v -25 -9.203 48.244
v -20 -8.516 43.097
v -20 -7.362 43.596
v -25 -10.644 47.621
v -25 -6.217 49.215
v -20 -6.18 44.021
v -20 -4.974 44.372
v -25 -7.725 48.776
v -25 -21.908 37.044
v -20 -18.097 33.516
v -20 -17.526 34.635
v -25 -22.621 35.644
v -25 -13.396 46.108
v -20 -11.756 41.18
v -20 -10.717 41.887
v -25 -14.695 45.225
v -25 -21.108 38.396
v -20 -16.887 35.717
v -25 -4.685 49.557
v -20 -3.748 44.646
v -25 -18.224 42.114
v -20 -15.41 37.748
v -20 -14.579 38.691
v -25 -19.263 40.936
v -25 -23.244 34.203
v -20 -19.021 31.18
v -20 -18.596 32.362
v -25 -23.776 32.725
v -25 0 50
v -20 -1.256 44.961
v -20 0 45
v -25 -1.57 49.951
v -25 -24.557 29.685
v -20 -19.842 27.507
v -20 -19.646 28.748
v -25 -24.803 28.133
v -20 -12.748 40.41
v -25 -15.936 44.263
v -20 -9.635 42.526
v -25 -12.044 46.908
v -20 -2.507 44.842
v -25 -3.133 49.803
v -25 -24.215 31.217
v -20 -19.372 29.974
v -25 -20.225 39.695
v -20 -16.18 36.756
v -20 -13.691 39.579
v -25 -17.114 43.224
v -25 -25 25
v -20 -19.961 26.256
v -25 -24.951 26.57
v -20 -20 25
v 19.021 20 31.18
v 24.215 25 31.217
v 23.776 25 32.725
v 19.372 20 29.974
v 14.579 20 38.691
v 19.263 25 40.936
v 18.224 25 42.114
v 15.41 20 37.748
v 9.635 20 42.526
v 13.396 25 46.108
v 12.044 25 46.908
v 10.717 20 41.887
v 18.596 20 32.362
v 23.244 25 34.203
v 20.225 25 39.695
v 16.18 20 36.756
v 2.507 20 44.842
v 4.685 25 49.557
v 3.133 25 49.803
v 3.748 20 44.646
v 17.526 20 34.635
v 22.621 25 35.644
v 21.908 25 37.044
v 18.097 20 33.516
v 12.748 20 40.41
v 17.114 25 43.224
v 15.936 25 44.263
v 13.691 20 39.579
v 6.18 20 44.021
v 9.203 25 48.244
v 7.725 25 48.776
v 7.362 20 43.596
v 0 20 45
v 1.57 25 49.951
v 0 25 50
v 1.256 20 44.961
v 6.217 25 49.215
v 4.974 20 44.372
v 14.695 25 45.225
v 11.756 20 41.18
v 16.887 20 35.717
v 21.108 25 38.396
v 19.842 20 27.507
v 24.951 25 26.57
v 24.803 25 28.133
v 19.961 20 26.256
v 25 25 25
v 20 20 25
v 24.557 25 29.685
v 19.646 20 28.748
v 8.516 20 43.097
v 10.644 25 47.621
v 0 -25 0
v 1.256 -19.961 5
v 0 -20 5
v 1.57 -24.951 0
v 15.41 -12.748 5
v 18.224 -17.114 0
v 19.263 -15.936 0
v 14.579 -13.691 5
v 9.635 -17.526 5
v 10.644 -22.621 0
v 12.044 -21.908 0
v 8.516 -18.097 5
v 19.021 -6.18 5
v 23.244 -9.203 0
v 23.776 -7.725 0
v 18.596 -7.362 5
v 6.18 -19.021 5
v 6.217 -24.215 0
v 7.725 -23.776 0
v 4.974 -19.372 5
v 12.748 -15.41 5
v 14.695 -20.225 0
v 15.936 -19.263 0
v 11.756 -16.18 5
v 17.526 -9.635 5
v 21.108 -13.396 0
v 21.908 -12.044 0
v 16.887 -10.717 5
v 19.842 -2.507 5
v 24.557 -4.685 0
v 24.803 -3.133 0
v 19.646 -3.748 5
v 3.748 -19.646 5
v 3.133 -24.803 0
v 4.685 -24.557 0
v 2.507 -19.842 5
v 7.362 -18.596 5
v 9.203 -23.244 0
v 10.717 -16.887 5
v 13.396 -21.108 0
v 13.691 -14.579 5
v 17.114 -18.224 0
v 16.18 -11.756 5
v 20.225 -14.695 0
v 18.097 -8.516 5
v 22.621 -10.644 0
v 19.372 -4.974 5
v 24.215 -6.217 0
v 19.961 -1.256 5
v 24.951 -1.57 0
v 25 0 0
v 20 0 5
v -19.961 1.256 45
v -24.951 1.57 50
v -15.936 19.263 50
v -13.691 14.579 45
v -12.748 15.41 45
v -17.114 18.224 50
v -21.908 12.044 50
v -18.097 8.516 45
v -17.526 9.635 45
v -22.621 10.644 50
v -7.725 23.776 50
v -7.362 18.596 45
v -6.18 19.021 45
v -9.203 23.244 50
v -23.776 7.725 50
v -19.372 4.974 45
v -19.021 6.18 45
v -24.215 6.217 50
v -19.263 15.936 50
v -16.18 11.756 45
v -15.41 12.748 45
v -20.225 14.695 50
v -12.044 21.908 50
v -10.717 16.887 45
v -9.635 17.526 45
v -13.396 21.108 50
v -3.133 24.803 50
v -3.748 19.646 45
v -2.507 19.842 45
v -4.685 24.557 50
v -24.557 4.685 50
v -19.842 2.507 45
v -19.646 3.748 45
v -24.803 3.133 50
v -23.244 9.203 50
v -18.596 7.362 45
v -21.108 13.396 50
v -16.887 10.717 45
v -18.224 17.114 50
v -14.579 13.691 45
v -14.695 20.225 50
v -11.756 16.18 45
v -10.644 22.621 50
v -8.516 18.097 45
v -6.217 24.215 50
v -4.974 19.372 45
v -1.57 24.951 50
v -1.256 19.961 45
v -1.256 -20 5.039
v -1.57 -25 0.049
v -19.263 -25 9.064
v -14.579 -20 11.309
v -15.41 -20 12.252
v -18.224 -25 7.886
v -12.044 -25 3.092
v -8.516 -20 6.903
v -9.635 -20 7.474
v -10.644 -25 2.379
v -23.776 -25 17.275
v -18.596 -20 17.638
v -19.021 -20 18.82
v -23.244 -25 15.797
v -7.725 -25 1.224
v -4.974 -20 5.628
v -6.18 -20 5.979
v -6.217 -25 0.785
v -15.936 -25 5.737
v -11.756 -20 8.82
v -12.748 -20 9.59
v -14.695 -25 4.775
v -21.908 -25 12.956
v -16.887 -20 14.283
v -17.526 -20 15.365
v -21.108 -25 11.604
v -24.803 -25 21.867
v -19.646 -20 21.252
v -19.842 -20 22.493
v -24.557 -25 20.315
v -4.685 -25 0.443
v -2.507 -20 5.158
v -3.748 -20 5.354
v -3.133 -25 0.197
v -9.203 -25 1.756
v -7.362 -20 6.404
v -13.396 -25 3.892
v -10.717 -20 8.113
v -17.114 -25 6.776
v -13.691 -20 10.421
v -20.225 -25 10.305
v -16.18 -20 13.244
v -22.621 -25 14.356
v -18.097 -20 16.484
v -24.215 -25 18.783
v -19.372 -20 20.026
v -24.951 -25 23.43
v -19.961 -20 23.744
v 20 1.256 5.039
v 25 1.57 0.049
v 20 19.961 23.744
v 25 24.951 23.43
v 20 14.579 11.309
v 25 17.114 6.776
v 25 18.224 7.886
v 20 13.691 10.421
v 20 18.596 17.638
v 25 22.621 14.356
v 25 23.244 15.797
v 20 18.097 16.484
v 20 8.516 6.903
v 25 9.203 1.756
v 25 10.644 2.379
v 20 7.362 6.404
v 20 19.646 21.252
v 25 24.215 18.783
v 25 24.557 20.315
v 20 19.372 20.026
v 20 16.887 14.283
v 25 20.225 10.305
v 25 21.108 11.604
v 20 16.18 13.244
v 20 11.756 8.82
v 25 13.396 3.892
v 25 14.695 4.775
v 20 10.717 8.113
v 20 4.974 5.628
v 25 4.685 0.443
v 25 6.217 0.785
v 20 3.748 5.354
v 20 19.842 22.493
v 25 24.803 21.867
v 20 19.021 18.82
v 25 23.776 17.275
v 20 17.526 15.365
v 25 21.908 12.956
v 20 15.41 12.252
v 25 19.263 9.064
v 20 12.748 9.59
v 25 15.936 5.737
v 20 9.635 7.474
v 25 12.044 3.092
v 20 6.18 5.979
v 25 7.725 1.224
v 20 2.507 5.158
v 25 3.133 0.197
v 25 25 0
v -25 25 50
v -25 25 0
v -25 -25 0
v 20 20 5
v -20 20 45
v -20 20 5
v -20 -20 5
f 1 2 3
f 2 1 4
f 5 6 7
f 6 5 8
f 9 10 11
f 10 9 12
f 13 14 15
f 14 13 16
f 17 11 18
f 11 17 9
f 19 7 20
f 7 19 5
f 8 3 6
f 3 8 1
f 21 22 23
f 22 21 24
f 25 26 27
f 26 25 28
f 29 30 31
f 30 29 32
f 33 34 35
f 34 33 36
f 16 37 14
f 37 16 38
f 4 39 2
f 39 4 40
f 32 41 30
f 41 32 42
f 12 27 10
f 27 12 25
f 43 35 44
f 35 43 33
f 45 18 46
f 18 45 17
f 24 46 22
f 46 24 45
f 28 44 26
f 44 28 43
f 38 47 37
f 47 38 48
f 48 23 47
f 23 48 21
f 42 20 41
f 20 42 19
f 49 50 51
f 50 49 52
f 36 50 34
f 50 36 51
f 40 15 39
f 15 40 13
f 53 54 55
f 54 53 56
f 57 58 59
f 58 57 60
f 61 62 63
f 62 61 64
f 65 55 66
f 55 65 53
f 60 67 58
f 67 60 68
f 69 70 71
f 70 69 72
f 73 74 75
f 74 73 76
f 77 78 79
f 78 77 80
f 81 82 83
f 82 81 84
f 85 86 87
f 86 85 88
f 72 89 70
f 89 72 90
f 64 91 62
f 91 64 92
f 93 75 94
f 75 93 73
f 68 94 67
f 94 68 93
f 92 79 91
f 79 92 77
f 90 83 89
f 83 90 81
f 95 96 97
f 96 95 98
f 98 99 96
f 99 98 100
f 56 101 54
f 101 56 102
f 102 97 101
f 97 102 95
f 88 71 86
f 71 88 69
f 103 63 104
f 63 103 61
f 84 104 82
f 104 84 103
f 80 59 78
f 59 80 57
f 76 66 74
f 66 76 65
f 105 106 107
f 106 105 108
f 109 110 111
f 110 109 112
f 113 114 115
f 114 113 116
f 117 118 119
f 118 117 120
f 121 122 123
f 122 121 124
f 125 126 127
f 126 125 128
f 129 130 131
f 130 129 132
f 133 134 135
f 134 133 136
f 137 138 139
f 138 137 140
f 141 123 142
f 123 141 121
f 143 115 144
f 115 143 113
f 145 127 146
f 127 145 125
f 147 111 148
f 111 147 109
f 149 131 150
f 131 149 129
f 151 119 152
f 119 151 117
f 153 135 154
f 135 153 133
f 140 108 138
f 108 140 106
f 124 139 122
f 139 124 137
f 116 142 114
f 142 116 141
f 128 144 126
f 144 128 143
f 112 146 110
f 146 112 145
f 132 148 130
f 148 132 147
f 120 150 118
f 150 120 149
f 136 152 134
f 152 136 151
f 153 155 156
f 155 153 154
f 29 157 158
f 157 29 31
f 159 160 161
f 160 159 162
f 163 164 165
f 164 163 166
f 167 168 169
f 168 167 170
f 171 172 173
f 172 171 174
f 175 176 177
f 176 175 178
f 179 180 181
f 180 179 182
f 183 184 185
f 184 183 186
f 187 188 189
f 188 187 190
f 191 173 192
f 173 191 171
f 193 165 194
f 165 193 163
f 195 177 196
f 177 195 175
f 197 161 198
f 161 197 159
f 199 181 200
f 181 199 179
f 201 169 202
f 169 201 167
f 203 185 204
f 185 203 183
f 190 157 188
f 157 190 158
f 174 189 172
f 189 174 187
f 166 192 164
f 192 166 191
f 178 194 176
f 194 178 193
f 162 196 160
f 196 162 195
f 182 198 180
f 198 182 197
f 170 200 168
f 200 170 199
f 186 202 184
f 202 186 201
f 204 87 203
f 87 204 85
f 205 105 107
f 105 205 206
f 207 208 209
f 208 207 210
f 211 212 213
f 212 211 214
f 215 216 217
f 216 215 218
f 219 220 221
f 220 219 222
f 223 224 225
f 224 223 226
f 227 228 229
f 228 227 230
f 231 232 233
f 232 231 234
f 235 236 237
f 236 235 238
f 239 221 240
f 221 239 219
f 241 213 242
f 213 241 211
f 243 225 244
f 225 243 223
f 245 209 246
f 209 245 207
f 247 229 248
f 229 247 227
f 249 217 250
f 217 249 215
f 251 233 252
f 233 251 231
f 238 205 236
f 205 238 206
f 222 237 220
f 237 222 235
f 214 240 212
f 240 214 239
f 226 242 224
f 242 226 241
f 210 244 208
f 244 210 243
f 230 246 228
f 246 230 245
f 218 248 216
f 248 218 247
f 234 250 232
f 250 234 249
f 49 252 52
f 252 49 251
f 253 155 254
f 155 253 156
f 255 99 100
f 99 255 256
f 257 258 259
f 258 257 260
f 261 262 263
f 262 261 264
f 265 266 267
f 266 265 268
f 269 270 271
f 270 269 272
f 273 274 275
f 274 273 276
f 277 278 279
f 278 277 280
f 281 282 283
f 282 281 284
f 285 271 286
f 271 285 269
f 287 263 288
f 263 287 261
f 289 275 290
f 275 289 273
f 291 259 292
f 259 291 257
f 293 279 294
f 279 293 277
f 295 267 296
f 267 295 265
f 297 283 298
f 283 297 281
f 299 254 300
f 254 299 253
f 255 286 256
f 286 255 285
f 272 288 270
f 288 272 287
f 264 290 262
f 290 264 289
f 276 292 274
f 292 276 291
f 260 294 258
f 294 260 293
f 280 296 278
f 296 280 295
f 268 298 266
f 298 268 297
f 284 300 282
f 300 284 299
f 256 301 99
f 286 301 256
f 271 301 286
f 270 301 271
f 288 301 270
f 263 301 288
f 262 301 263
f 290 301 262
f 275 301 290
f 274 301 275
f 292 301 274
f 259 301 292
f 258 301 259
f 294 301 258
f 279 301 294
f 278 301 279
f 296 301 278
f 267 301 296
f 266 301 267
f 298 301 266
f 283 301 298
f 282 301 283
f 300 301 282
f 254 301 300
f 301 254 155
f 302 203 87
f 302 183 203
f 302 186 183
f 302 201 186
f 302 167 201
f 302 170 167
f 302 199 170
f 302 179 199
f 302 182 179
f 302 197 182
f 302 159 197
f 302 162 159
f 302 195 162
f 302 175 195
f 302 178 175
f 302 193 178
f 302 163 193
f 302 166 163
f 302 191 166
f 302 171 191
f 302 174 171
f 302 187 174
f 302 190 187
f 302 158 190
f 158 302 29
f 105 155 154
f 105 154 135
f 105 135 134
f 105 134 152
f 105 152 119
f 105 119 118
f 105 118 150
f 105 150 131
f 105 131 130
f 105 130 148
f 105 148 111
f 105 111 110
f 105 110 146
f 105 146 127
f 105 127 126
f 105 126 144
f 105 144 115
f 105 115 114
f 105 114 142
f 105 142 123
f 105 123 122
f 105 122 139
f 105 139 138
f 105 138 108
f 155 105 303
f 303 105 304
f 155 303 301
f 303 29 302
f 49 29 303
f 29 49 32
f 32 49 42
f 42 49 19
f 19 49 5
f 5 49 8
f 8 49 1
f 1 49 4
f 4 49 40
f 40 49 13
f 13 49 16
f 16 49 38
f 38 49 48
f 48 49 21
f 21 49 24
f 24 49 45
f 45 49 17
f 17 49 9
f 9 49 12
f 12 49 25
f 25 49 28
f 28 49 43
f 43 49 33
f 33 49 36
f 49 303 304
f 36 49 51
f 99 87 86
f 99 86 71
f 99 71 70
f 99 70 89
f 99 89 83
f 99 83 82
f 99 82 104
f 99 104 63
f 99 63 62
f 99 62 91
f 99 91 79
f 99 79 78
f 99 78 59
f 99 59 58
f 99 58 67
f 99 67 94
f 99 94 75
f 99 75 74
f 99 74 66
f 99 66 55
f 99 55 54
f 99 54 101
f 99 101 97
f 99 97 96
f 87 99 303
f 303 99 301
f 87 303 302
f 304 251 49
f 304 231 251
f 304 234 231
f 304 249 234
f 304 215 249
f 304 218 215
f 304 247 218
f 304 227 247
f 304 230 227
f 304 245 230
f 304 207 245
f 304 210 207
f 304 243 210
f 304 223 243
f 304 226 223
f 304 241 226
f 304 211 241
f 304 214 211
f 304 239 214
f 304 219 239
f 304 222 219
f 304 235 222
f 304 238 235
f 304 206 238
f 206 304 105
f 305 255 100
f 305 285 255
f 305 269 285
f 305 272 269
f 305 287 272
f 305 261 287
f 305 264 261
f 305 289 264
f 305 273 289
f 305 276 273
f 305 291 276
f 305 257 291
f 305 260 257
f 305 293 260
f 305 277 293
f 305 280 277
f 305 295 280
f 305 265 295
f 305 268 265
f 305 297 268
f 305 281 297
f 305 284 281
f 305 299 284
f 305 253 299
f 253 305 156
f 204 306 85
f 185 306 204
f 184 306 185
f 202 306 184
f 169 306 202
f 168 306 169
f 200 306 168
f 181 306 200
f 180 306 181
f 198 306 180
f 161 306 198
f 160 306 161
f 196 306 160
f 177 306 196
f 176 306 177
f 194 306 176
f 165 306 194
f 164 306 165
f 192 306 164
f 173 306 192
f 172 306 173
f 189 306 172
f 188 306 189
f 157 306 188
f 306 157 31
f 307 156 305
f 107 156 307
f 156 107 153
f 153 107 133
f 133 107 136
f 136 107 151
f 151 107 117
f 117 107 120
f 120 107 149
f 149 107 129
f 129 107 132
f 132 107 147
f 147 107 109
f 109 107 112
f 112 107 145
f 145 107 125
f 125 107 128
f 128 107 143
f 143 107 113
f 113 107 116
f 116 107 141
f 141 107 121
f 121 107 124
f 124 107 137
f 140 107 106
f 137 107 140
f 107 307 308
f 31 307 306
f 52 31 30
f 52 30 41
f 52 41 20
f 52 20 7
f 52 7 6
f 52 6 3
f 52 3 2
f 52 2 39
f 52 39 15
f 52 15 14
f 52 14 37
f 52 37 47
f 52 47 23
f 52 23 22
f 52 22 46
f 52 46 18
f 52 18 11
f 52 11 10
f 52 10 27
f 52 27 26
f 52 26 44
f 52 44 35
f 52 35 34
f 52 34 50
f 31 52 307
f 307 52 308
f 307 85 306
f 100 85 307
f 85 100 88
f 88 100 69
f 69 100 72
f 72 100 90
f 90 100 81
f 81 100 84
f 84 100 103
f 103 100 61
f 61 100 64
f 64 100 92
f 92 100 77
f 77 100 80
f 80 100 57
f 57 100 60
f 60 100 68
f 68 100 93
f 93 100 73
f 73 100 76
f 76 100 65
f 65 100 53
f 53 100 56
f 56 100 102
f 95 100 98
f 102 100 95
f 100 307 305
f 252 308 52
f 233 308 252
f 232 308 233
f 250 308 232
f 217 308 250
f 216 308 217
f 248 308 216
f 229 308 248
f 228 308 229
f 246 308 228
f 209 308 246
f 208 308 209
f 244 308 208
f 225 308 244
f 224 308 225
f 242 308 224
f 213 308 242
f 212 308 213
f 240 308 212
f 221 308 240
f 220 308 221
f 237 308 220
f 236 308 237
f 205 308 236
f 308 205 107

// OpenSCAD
curvetype = 1; // [1, 2, 3]
size = 50;
// Wall thickness, between inside and outside of cube.  Only relevant for Hollow style
thickness = 5;
// Adds thickness to walls portion that would be 0 width.  Only used for Curve Type 3
MinWall = 3;
solid = 0; // [1:Solid, 0:Hollow]
detail = 100;

module CurvyCube() {
  $fn = detail;
  translate([0,0,size/2]) {
    difference() {
      intersection() {
        difference() {
          union() {
            difference() {
              cube(size=size*1.5, center=true);
              rotate([0,0,45]) rotate([atan(2/sqrt(2)),0,0]) translate([0,0,size*4]) cube(size=size*8, center=true);
            }
            rotate([0,-90,0]) cylinder(h=size*2, r1=0,r2=size*2);
            rotate([-90,0,0]) cylinder(h=size*2, r1=0,r2=size*2);
            rotate([0,180,0]) cylinder(h=size*2, r1=0,r2=size*2);
          }
          rotate([0,0,0]) cylinder(h=size*2, r1=0,r2=size*2);
          rotate([90,0,0]) cylinder(h=size*2, r1=0,r2=size*2);
          rotate([0,90,0]) cylinder(h=size*2, r1=0,r2=size*2);
        }
      cube(size=size, center=true);
      }
    if (!solid) cube(size=size-thickness*2, center=true);
    }
  }
}

module dualRadiusCone(d, thick, angle) {
  r = d/2;
  $fn = detail;
  s = (r - thick) / r;
  err = 0.01; // avoid coincident faces
  rotate([0,0,angle]) 
    union() {  
      intersection() {
        cylinder(h=r+err, r1=0,r2=r+err);
        rotate([0,0,0]) translate([-err,-err,err]) cube(size=r*2);
      }
      scale([1,s,1]) intersection () { 
        cylinder(h=r+err, r1=0,r2=r+err);
        rotate([0,0,270]) translate([-err,-err,err]) cube(size=r*2);
      }
      scale([s,s,1]) intersection() {
        cylinder(h=r+err, r1=0,r2=r+err);
        rotate([0,0,180]) translate([-err,-err,err]) cube(size=r*2);
      }
      scale([s,1,1]) intersection () { 
        cylinder(h=r+err, r1=0,r2=r+err);
        rotate([0,0,90]) translate([-err,-err,err]) cube(size=r*2);
      }
    }  
}

module CurvyCube3() {
  $fn = detail;
  err = 0.001;
  translate([0,0,size/2]) rotate([0,0,0]){
    difference() {
      intersection() {
        cube(size=size, center=true);
        union() {
          difference() {
            cube(size=size*1.5, center=true);
            rotate([0,0,45]) rotate([atan(2/sqrt(2)),0,0]) translate([0,0,size*4]) cube(size=size*8, center=true);
            rotate([0,-90,0]) dualRadiusCone(size, MinWall, -90);
            rotate([-90,0,0]) dualRadiusCone(size, MinWall, -90);
            rotate([0,180,0]) dualRadiusCone(size, MinWall, 180);
          }
          rotate([0,0,0]) dualRadiusCone(size, MinWall, 90);
          rotate([90,0,0]) dualRadiusCone(size, MinWall, 180);
          rotate([0,90,0]) dualRadiusCone(size, MinWall, 0);
        }
      }
      if (!solid) cube(size=size-thickness*2, center=true);
    }
  }
}

module CurvyCube2() {
  $fn = detail;
  translate([0,0,size/2]) {
    difference() {
      difference() { 
        cube(size=size, center=true);
        rotate([0,90,0]) cylinder(h=size*2, r1=0,r2=size*2);
        rotate([0,-90,0]) cylinder(h=size*2, r1=0,r2=size*2);
      }
      difference() {
        translate([-size, -size, 0]) cube(size=size*2);
        rotate([90,0,0]) cylinder(h=size*2, r1=0,r2=size*2);
        rotate([-90,0,0]) cylinder(h=size*2, r1=0,r2=size*2);
      }
      if (!solid) cube(size-thickness*2, size-thickness*2, size-thickness*2, center=true);
    }
  }
}

if (curvetype == 1) {
  color("DeepSkyBlue", 1) CurvyCube();
  //color("orange", 1) translate([10,-10,size+10]) rotate([180,0,0]) rotate([0,0,-90])  CurvyCube();
} else if (curvetype == 2) {
  color("Red", 1) CurvyCube2();
  //color("silver", 1) translate([0.01,0.01,size*1.75]) rotate([180,0,0]) rotate([0,0,-90]) CurvyCube2();
} else if (curvetype == 3) {
  color("lime", 1) CurvyCube3();
  //color("magenta", 1) translate([size,-size,size*1.75]) rotate([180,0,0]) rotate([0,0,-90]) CurvyCube3();
}
